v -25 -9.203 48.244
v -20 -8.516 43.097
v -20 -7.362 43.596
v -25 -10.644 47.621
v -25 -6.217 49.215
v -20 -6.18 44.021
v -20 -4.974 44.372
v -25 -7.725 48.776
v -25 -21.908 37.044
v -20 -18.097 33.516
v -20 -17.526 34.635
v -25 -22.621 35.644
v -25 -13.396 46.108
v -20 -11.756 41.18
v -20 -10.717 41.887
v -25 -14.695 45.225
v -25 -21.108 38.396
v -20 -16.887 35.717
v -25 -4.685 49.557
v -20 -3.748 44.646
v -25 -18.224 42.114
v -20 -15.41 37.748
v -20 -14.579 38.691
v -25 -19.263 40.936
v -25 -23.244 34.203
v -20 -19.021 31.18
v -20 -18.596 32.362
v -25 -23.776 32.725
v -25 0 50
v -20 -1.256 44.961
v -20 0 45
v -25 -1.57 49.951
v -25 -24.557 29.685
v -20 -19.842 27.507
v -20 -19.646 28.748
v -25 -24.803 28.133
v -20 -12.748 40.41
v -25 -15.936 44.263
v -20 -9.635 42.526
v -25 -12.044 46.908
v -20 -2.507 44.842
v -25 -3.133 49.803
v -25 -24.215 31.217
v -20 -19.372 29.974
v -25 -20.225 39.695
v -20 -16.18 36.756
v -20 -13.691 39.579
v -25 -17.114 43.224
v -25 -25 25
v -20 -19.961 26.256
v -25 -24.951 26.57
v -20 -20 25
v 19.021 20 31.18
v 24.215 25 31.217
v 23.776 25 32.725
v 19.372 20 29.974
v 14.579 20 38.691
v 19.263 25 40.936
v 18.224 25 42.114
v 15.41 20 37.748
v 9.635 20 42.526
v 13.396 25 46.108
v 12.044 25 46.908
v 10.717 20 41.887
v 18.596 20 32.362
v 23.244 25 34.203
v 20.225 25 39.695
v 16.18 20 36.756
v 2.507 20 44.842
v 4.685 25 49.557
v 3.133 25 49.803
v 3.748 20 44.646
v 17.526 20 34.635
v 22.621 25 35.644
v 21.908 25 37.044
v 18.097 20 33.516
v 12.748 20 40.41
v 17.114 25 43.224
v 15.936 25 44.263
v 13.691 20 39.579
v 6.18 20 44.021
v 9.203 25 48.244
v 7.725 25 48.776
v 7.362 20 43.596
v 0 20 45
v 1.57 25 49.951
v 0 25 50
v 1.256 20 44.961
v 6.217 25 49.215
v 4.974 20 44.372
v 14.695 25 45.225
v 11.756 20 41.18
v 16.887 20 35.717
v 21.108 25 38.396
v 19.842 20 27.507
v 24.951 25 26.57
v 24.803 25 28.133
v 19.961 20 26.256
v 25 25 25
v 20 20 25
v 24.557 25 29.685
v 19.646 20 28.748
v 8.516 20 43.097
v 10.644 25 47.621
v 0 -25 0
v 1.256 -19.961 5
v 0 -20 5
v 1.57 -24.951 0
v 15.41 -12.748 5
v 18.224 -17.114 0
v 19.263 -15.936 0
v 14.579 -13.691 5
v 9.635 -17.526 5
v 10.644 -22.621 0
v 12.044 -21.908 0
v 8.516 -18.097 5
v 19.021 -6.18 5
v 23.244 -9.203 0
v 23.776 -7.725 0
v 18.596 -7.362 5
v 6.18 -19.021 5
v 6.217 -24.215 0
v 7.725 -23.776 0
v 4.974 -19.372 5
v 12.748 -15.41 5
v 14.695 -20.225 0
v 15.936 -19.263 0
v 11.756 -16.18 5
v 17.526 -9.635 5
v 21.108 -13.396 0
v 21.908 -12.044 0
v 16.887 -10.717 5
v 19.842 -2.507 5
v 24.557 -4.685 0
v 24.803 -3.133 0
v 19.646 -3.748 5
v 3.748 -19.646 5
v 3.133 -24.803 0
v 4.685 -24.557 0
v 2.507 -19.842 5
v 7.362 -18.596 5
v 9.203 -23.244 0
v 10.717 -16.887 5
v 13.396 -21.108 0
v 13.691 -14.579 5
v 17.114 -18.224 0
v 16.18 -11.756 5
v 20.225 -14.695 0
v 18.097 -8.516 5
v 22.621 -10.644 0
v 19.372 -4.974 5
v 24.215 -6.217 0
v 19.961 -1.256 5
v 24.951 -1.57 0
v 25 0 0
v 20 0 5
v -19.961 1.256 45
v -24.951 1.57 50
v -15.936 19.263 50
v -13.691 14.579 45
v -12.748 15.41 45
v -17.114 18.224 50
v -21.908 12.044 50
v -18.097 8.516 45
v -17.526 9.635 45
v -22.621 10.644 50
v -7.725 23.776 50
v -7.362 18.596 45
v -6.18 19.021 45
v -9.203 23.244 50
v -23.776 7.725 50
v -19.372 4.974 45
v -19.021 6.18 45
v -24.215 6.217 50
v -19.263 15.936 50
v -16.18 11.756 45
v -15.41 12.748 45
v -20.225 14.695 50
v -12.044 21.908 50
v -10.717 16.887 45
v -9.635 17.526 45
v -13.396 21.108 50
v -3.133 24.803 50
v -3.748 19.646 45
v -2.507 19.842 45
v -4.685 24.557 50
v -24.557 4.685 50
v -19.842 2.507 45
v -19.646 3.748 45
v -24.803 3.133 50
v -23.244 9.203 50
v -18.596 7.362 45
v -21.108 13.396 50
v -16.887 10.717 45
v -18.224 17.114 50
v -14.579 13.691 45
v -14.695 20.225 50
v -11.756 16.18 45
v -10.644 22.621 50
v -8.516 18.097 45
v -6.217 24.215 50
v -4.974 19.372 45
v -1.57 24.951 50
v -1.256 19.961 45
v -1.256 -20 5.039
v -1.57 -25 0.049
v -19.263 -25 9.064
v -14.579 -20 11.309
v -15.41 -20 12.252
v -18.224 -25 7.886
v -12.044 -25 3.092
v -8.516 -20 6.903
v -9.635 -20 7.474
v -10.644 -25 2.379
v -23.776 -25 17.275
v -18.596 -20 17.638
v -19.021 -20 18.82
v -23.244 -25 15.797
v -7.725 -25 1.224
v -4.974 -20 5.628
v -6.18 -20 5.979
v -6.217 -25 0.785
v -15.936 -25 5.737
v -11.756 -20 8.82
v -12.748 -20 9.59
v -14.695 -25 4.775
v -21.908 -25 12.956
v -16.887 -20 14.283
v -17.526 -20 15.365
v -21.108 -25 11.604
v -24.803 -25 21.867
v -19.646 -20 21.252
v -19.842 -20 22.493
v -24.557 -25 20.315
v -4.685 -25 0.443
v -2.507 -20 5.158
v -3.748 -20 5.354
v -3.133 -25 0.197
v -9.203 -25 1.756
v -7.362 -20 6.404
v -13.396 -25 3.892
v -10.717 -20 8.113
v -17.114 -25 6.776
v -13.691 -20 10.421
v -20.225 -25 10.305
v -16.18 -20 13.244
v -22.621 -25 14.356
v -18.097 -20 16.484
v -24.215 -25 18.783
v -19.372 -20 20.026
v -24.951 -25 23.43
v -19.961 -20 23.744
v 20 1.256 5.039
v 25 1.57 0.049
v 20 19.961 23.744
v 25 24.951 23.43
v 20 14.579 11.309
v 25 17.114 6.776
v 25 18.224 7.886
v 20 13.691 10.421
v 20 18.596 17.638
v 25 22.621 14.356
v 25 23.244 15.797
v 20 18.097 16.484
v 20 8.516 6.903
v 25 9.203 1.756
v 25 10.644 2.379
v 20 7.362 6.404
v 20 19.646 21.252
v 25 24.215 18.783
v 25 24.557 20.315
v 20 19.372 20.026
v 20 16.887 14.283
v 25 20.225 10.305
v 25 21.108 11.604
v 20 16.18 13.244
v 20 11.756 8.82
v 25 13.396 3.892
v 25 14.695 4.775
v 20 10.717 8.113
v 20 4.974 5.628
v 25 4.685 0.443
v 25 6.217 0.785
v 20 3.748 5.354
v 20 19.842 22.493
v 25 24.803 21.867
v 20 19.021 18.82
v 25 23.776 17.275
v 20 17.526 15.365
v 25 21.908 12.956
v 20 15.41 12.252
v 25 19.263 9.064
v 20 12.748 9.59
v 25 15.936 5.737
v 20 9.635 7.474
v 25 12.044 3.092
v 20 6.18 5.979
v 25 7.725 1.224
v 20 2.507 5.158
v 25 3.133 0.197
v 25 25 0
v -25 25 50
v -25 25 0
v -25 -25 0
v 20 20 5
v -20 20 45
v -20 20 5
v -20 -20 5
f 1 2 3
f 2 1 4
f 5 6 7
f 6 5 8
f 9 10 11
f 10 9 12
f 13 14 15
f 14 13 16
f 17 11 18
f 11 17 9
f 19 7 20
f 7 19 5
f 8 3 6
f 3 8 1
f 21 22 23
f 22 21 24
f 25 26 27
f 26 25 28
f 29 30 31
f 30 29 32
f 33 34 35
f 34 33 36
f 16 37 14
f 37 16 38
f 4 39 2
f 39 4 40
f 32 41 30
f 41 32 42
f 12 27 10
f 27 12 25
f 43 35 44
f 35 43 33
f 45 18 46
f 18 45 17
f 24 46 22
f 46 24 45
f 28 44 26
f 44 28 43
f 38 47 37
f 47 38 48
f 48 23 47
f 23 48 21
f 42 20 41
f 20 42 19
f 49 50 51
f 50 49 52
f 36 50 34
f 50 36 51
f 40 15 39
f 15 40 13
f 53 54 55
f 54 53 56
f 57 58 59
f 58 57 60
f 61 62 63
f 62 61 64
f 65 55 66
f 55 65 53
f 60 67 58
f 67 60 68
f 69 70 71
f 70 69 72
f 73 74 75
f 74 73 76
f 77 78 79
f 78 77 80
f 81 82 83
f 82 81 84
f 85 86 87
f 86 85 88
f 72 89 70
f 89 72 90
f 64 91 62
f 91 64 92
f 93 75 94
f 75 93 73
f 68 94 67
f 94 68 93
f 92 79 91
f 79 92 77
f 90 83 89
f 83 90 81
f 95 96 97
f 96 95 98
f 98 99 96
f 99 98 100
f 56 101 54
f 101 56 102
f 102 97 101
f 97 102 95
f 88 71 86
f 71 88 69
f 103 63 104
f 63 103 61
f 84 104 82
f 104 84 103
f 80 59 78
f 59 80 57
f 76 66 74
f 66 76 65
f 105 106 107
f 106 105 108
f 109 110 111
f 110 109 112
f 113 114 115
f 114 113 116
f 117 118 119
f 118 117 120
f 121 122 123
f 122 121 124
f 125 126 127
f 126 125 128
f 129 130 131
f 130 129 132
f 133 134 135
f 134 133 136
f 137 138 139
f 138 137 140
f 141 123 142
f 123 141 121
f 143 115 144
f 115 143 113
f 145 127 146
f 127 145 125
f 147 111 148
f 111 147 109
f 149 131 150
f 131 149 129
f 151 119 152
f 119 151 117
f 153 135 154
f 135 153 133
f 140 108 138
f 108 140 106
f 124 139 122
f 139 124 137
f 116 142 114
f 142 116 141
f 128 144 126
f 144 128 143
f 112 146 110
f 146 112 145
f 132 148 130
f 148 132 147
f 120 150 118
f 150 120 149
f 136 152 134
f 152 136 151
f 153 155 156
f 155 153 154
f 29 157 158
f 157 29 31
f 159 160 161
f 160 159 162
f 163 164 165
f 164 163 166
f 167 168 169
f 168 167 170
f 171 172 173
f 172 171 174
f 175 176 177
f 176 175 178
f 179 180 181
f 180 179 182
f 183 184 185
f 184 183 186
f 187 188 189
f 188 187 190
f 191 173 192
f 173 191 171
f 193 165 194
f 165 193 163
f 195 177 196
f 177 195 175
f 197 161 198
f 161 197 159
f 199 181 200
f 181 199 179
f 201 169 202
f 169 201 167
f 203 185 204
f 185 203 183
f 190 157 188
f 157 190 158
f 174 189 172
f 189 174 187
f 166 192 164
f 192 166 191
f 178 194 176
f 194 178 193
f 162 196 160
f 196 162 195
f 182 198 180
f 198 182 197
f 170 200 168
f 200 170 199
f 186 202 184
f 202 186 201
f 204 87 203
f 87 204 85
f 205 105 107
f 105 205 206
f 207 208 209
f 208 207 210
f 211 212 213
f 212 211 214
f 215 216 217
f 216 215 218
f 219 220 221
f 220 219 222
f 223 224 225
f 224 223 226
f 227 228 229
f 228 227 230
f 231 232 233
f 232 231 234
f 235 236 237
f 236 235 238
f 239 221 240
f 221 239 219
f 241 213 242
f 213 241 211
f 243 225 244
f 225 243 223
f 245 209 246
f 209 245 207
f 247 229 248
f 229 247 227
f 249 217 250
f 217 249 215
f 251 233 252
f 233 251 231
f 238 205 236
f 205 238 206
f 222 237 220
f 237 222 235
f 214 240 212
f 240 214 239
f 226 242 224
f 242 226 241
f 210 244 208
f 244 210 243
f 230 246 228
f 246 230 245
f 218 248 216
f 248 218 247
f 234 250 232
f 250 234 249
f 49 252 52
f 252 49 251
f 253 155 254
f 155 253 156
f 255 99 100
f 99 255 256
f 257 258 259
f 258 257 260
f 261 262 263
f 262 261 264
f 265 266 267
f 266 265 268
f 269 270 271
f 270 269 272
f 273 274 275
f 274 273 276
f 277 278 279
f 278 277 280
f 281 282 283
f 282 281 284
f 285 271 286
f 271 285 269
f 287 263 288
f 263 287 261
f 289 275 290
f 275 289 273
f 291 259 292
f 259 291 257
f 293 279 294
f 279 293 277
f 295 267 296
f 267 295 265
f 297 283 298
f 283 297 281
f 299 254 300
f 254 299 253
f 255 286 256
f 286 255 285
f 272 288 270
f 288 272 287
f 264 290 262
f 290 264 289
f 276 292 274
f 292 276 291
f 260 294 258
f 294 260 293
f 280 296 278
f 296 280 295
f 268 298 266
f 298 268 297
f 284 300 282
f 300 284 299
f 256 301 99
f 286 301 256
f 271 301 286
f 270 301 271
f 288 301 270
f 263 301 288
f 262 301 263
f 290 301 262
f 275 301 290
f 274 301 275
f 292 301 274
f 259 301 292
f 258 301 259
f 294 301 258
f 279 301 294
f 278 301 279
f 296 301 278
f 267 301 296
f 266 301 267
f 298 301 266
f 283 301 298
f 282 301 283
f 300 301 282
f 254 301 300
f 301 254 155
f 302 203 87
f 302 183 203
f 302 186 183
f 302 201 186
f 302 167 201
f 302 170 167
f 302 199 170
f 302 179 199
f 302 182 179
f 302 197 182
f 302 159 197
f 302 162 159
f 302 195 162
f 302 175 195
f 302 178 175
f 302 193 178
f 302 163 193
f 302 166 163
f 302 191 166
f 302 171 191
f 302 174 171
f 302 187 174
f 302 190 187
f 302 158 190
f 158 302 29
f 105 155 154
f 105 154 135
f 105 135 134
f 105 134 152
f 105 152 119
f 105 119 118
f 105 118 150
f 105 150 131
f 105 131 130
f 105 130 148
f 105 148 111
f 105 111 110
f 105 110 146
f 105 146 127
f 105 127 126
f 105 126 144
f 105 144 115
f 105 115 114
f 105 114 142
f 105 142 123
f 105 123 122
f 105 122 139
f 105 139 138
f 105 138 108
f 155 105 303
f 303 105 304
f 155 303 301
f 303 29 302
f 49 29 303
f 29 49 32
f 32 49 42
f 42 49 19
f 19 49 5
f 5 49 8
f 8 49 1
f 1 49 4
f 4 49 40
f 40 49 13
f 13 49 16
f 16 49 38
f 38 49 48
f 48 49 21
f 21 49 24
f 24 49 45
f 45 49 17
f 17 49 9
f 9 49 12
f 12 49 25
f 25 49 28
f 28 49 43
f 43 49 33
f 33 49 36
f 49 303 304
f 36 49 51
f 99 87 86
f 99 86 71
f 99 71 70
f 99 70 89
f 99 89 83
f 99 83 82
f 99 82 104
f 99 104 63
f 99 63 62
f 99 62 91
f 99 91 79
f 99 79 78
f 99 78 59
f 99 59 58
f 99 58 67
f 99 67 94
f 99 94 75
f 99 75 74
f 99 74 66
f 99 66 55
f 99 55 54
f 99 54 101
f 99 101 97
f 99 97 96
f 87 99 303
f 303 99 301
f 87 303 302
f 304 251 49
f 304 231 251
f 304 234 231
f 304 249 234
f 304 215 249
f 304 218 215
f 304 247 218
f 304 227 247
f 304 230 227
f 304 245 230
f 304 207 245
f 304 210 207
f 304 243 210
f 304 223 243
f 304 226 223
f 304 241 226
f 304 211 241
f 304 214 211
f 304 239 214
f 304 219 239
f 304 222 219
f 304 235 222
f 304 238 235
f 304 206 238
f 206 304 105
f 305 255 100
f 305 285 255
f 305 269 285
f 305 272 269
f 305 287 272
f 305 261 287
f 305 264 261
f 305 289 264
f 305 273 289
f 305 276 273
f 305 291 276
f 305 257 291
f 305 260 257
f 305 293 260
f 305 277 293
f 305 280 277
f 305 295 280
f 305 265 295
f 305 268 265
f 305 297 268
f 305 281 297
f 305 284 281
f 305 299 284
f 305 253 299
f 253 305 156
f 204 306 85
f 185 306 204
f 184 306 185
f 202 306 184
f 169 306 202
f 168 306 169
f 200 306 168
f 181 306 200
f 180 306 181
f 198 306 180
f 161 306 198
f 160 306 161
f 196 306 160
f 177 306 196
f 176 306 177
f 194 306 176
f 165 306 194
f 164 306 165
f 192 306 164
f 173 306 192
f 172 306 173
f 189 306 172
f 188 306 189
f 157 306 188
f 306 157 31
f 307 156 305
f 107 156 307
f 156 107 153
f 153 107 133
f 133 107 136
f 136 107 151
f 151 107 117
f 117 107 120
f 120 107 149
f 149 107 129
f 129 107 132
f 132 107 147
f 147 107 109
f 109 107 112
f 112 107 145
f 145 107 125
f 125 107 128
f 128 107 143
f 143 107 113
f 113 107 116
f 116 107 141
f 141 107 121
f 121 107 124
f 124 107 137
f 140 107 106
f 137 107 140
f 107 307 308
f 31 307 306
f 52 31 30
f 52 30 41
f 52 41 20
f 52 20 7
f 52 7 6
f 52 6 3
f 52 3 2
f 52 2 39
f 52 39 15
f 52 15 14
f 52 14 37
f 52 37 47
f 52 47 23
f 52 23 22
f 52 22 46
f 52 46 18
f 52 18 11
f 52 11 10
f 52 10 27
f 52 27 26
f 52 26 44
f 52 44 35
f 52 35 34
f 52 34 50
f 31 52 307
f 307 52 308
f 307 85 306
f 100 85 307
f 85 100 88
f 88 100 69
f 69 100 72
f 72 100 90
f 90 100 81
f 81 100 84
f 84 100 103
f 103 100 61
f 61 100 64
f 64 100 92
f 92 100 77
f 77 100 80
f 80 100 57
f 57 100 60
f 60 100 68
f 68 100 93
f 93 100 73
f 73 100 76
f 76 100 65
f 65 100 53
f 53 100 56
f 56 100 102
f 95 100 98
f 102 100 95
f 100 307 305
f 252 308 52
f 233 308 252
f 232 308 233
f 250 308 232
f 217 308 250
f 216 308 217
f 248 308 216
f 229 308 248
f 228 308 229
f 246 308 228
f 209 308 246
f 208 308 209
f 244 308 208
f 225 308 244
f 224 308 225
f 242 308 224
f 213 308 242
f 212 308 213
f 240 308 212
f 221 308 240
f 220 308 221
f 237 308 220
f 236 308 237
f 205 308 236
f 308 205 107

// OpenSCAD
curvetype = 1; // [1, 2, 3]
size = 50;
// Wall thickness, between inside and outside of cube.  Only relevant for Hollow style
thickness = 5;
// Adds thickness to walls portion that would be 0 width.  Only used for Curve Type 3
MinWall = 3;
solid = 0; // [1:Solid, 0:Hollow]
detail = 100;

module CurvyCube() {
  $fn = detail;
  translate([0,0,size/2]) {
    difference() {
      intersection() {
        difference() {
          union() {
            difference() {
              cube(size=size*1.5, center=true);
              rotate([0,0,45]) rotate([atan(2/sqrt(2)),0,0]) translate([0,0,size*4]) cube(size=size*8, center=true);
            }
            rotate([0,-90,0]) cylinder(h=size*2, r1=0,r2=size*2);
            rotate([-90,0,0]) cylinder(h=size*2, r1=0,r2=size*2);
            rotate([0,180,0]) cylinder(h=size*2, r1=0,r2=size*2);
          }
          rotate([0,0,0]) cylinder(h=size*2, r1=0,r2=size*2);
          rotate([90,0,0]) cylinder(h=size*2, r1=0,r2=size*2);
          rotate([0,90,0]) cylinder(h=size*2, r1=0,r2=size*2);
        }
      cube(size=size, center=true);
      }
    if (!solid) cube(size=size-thickness*2, center=true);
    }
  }
}

module dualRadiusCone(d, thick, angle) {
  r = d/2;
  $fn = detail;
  s = (r - thick) / r;
  err = 0.01; // avoid coincident faces
  rotate([0,0,angle]) 
    union() {  
      intersection() {
        cylinder(h=r+err, r1=0,r2=r+err);
        rotate([0,0,0]) translate([-err,-err,err]) cube(size=r*2);
      }
      scale([1,s,1]) intersection () { 
        cylinder(h=r+err, r1=0,r2=r+err);
        rotate([0,0,270]) translate([-err,-err,err]) cube(size=r*2);
      }
      scale([s,s,1]) intersection() {
        cylinder(h=r+err, r1=0,r2=r+err);
        rotate([0,0,180]) translate([-err,-err,err]) cube(size=r*2);
      }
      scale([s,1,1]) intersection () { 
        cylinder(h=r+err, r1=0,r2=r+err);
        rotate([0,0,90]) translate([-err,-err,err]) cube(size=r*2);
      }
    }  
}

module CurvyCube3() {
  $fn = detail;
  err = 0.001;
  translate([0,0,size/2]) rotate([0,0,0]){
    difference() {
      intersection() {
        cube(size=size, center=true);
        union() {
          difference() {
            cube(size=size*1.5, center=true);
            rotate([0,0,45]) rotate([atan(2/sqrt(2)),0,0]) translate([0,0,size*4]) cube(size=size*8, center=true);
            rotate([0,-90,0]) dualRadiusCone(size, MinWall, -90);
            rotate([-90,0,0]) dualRadiusCone(size, MinWall, -90);
            rotate([0,180,0]) dualRadiusCone(size, MinWall, 180);
          }
          rotate([0,0,0]) dualRadiusCone(size, MinWall, 90);
          rotate([90,0,0]) dualRadiusCone(size, MinWall, 180);
          rotate([0,90,0]) dualRadiusCone(size, MinWall, 0);
        }
      }
      if (!solid) cube(size=size-thickness*2, center=true);
    }
  }
}

module CurvyCube2() {
  $fn = detail;
  translate([0,0,size/2]) {
    difference() {
      difference() { 
        cube(size=size, center=true);
        rotate([0,90,0]) cylinder(h=size*2, r1=0,r2=size*2);
        rotate([0,-90,0]) cylinder(h=size*2, r1=0,r2=size*2);
      }
      difference() {
        translate([-size, -size, 0]) cube(size=size*2);
        rotate([90,0,0]) cylinder(h=size*2, r1=0,r2=size*2);
        rotate([-90,0,0]) cylinder(h=size*2, r1=0,r2=size*2);
      }
      if (!solid) cube(size-thickness*2, size-thickness*2, size-thickness*2, center=true);
    }
  }
}

if (curvetype == 1) {
  color("DeepSkyBlue", 1) CurvyCube();
  //color("orange", 1) translate([10,-10,size+10]) rotate([180,0,0]) rotate([0,0,-90])  CurvyCube();
} else if (curvetype == 2) {
  color("Red", 1) CurvyCube2();
  //color("silver", 1) translate([0.01,0.01,size*1.75]) rotate([180,0,0]) rotate([0,0,-90]) CurvyCube2();
} else if (curvetype == 3) {
  color("lime", 1) CurvyCube3();
  //color("magenta", 1) translate([size,-size,size*1.75]) rotate([180,0,0]) rotate([0,0,-90]) CurvyCube3();
}
